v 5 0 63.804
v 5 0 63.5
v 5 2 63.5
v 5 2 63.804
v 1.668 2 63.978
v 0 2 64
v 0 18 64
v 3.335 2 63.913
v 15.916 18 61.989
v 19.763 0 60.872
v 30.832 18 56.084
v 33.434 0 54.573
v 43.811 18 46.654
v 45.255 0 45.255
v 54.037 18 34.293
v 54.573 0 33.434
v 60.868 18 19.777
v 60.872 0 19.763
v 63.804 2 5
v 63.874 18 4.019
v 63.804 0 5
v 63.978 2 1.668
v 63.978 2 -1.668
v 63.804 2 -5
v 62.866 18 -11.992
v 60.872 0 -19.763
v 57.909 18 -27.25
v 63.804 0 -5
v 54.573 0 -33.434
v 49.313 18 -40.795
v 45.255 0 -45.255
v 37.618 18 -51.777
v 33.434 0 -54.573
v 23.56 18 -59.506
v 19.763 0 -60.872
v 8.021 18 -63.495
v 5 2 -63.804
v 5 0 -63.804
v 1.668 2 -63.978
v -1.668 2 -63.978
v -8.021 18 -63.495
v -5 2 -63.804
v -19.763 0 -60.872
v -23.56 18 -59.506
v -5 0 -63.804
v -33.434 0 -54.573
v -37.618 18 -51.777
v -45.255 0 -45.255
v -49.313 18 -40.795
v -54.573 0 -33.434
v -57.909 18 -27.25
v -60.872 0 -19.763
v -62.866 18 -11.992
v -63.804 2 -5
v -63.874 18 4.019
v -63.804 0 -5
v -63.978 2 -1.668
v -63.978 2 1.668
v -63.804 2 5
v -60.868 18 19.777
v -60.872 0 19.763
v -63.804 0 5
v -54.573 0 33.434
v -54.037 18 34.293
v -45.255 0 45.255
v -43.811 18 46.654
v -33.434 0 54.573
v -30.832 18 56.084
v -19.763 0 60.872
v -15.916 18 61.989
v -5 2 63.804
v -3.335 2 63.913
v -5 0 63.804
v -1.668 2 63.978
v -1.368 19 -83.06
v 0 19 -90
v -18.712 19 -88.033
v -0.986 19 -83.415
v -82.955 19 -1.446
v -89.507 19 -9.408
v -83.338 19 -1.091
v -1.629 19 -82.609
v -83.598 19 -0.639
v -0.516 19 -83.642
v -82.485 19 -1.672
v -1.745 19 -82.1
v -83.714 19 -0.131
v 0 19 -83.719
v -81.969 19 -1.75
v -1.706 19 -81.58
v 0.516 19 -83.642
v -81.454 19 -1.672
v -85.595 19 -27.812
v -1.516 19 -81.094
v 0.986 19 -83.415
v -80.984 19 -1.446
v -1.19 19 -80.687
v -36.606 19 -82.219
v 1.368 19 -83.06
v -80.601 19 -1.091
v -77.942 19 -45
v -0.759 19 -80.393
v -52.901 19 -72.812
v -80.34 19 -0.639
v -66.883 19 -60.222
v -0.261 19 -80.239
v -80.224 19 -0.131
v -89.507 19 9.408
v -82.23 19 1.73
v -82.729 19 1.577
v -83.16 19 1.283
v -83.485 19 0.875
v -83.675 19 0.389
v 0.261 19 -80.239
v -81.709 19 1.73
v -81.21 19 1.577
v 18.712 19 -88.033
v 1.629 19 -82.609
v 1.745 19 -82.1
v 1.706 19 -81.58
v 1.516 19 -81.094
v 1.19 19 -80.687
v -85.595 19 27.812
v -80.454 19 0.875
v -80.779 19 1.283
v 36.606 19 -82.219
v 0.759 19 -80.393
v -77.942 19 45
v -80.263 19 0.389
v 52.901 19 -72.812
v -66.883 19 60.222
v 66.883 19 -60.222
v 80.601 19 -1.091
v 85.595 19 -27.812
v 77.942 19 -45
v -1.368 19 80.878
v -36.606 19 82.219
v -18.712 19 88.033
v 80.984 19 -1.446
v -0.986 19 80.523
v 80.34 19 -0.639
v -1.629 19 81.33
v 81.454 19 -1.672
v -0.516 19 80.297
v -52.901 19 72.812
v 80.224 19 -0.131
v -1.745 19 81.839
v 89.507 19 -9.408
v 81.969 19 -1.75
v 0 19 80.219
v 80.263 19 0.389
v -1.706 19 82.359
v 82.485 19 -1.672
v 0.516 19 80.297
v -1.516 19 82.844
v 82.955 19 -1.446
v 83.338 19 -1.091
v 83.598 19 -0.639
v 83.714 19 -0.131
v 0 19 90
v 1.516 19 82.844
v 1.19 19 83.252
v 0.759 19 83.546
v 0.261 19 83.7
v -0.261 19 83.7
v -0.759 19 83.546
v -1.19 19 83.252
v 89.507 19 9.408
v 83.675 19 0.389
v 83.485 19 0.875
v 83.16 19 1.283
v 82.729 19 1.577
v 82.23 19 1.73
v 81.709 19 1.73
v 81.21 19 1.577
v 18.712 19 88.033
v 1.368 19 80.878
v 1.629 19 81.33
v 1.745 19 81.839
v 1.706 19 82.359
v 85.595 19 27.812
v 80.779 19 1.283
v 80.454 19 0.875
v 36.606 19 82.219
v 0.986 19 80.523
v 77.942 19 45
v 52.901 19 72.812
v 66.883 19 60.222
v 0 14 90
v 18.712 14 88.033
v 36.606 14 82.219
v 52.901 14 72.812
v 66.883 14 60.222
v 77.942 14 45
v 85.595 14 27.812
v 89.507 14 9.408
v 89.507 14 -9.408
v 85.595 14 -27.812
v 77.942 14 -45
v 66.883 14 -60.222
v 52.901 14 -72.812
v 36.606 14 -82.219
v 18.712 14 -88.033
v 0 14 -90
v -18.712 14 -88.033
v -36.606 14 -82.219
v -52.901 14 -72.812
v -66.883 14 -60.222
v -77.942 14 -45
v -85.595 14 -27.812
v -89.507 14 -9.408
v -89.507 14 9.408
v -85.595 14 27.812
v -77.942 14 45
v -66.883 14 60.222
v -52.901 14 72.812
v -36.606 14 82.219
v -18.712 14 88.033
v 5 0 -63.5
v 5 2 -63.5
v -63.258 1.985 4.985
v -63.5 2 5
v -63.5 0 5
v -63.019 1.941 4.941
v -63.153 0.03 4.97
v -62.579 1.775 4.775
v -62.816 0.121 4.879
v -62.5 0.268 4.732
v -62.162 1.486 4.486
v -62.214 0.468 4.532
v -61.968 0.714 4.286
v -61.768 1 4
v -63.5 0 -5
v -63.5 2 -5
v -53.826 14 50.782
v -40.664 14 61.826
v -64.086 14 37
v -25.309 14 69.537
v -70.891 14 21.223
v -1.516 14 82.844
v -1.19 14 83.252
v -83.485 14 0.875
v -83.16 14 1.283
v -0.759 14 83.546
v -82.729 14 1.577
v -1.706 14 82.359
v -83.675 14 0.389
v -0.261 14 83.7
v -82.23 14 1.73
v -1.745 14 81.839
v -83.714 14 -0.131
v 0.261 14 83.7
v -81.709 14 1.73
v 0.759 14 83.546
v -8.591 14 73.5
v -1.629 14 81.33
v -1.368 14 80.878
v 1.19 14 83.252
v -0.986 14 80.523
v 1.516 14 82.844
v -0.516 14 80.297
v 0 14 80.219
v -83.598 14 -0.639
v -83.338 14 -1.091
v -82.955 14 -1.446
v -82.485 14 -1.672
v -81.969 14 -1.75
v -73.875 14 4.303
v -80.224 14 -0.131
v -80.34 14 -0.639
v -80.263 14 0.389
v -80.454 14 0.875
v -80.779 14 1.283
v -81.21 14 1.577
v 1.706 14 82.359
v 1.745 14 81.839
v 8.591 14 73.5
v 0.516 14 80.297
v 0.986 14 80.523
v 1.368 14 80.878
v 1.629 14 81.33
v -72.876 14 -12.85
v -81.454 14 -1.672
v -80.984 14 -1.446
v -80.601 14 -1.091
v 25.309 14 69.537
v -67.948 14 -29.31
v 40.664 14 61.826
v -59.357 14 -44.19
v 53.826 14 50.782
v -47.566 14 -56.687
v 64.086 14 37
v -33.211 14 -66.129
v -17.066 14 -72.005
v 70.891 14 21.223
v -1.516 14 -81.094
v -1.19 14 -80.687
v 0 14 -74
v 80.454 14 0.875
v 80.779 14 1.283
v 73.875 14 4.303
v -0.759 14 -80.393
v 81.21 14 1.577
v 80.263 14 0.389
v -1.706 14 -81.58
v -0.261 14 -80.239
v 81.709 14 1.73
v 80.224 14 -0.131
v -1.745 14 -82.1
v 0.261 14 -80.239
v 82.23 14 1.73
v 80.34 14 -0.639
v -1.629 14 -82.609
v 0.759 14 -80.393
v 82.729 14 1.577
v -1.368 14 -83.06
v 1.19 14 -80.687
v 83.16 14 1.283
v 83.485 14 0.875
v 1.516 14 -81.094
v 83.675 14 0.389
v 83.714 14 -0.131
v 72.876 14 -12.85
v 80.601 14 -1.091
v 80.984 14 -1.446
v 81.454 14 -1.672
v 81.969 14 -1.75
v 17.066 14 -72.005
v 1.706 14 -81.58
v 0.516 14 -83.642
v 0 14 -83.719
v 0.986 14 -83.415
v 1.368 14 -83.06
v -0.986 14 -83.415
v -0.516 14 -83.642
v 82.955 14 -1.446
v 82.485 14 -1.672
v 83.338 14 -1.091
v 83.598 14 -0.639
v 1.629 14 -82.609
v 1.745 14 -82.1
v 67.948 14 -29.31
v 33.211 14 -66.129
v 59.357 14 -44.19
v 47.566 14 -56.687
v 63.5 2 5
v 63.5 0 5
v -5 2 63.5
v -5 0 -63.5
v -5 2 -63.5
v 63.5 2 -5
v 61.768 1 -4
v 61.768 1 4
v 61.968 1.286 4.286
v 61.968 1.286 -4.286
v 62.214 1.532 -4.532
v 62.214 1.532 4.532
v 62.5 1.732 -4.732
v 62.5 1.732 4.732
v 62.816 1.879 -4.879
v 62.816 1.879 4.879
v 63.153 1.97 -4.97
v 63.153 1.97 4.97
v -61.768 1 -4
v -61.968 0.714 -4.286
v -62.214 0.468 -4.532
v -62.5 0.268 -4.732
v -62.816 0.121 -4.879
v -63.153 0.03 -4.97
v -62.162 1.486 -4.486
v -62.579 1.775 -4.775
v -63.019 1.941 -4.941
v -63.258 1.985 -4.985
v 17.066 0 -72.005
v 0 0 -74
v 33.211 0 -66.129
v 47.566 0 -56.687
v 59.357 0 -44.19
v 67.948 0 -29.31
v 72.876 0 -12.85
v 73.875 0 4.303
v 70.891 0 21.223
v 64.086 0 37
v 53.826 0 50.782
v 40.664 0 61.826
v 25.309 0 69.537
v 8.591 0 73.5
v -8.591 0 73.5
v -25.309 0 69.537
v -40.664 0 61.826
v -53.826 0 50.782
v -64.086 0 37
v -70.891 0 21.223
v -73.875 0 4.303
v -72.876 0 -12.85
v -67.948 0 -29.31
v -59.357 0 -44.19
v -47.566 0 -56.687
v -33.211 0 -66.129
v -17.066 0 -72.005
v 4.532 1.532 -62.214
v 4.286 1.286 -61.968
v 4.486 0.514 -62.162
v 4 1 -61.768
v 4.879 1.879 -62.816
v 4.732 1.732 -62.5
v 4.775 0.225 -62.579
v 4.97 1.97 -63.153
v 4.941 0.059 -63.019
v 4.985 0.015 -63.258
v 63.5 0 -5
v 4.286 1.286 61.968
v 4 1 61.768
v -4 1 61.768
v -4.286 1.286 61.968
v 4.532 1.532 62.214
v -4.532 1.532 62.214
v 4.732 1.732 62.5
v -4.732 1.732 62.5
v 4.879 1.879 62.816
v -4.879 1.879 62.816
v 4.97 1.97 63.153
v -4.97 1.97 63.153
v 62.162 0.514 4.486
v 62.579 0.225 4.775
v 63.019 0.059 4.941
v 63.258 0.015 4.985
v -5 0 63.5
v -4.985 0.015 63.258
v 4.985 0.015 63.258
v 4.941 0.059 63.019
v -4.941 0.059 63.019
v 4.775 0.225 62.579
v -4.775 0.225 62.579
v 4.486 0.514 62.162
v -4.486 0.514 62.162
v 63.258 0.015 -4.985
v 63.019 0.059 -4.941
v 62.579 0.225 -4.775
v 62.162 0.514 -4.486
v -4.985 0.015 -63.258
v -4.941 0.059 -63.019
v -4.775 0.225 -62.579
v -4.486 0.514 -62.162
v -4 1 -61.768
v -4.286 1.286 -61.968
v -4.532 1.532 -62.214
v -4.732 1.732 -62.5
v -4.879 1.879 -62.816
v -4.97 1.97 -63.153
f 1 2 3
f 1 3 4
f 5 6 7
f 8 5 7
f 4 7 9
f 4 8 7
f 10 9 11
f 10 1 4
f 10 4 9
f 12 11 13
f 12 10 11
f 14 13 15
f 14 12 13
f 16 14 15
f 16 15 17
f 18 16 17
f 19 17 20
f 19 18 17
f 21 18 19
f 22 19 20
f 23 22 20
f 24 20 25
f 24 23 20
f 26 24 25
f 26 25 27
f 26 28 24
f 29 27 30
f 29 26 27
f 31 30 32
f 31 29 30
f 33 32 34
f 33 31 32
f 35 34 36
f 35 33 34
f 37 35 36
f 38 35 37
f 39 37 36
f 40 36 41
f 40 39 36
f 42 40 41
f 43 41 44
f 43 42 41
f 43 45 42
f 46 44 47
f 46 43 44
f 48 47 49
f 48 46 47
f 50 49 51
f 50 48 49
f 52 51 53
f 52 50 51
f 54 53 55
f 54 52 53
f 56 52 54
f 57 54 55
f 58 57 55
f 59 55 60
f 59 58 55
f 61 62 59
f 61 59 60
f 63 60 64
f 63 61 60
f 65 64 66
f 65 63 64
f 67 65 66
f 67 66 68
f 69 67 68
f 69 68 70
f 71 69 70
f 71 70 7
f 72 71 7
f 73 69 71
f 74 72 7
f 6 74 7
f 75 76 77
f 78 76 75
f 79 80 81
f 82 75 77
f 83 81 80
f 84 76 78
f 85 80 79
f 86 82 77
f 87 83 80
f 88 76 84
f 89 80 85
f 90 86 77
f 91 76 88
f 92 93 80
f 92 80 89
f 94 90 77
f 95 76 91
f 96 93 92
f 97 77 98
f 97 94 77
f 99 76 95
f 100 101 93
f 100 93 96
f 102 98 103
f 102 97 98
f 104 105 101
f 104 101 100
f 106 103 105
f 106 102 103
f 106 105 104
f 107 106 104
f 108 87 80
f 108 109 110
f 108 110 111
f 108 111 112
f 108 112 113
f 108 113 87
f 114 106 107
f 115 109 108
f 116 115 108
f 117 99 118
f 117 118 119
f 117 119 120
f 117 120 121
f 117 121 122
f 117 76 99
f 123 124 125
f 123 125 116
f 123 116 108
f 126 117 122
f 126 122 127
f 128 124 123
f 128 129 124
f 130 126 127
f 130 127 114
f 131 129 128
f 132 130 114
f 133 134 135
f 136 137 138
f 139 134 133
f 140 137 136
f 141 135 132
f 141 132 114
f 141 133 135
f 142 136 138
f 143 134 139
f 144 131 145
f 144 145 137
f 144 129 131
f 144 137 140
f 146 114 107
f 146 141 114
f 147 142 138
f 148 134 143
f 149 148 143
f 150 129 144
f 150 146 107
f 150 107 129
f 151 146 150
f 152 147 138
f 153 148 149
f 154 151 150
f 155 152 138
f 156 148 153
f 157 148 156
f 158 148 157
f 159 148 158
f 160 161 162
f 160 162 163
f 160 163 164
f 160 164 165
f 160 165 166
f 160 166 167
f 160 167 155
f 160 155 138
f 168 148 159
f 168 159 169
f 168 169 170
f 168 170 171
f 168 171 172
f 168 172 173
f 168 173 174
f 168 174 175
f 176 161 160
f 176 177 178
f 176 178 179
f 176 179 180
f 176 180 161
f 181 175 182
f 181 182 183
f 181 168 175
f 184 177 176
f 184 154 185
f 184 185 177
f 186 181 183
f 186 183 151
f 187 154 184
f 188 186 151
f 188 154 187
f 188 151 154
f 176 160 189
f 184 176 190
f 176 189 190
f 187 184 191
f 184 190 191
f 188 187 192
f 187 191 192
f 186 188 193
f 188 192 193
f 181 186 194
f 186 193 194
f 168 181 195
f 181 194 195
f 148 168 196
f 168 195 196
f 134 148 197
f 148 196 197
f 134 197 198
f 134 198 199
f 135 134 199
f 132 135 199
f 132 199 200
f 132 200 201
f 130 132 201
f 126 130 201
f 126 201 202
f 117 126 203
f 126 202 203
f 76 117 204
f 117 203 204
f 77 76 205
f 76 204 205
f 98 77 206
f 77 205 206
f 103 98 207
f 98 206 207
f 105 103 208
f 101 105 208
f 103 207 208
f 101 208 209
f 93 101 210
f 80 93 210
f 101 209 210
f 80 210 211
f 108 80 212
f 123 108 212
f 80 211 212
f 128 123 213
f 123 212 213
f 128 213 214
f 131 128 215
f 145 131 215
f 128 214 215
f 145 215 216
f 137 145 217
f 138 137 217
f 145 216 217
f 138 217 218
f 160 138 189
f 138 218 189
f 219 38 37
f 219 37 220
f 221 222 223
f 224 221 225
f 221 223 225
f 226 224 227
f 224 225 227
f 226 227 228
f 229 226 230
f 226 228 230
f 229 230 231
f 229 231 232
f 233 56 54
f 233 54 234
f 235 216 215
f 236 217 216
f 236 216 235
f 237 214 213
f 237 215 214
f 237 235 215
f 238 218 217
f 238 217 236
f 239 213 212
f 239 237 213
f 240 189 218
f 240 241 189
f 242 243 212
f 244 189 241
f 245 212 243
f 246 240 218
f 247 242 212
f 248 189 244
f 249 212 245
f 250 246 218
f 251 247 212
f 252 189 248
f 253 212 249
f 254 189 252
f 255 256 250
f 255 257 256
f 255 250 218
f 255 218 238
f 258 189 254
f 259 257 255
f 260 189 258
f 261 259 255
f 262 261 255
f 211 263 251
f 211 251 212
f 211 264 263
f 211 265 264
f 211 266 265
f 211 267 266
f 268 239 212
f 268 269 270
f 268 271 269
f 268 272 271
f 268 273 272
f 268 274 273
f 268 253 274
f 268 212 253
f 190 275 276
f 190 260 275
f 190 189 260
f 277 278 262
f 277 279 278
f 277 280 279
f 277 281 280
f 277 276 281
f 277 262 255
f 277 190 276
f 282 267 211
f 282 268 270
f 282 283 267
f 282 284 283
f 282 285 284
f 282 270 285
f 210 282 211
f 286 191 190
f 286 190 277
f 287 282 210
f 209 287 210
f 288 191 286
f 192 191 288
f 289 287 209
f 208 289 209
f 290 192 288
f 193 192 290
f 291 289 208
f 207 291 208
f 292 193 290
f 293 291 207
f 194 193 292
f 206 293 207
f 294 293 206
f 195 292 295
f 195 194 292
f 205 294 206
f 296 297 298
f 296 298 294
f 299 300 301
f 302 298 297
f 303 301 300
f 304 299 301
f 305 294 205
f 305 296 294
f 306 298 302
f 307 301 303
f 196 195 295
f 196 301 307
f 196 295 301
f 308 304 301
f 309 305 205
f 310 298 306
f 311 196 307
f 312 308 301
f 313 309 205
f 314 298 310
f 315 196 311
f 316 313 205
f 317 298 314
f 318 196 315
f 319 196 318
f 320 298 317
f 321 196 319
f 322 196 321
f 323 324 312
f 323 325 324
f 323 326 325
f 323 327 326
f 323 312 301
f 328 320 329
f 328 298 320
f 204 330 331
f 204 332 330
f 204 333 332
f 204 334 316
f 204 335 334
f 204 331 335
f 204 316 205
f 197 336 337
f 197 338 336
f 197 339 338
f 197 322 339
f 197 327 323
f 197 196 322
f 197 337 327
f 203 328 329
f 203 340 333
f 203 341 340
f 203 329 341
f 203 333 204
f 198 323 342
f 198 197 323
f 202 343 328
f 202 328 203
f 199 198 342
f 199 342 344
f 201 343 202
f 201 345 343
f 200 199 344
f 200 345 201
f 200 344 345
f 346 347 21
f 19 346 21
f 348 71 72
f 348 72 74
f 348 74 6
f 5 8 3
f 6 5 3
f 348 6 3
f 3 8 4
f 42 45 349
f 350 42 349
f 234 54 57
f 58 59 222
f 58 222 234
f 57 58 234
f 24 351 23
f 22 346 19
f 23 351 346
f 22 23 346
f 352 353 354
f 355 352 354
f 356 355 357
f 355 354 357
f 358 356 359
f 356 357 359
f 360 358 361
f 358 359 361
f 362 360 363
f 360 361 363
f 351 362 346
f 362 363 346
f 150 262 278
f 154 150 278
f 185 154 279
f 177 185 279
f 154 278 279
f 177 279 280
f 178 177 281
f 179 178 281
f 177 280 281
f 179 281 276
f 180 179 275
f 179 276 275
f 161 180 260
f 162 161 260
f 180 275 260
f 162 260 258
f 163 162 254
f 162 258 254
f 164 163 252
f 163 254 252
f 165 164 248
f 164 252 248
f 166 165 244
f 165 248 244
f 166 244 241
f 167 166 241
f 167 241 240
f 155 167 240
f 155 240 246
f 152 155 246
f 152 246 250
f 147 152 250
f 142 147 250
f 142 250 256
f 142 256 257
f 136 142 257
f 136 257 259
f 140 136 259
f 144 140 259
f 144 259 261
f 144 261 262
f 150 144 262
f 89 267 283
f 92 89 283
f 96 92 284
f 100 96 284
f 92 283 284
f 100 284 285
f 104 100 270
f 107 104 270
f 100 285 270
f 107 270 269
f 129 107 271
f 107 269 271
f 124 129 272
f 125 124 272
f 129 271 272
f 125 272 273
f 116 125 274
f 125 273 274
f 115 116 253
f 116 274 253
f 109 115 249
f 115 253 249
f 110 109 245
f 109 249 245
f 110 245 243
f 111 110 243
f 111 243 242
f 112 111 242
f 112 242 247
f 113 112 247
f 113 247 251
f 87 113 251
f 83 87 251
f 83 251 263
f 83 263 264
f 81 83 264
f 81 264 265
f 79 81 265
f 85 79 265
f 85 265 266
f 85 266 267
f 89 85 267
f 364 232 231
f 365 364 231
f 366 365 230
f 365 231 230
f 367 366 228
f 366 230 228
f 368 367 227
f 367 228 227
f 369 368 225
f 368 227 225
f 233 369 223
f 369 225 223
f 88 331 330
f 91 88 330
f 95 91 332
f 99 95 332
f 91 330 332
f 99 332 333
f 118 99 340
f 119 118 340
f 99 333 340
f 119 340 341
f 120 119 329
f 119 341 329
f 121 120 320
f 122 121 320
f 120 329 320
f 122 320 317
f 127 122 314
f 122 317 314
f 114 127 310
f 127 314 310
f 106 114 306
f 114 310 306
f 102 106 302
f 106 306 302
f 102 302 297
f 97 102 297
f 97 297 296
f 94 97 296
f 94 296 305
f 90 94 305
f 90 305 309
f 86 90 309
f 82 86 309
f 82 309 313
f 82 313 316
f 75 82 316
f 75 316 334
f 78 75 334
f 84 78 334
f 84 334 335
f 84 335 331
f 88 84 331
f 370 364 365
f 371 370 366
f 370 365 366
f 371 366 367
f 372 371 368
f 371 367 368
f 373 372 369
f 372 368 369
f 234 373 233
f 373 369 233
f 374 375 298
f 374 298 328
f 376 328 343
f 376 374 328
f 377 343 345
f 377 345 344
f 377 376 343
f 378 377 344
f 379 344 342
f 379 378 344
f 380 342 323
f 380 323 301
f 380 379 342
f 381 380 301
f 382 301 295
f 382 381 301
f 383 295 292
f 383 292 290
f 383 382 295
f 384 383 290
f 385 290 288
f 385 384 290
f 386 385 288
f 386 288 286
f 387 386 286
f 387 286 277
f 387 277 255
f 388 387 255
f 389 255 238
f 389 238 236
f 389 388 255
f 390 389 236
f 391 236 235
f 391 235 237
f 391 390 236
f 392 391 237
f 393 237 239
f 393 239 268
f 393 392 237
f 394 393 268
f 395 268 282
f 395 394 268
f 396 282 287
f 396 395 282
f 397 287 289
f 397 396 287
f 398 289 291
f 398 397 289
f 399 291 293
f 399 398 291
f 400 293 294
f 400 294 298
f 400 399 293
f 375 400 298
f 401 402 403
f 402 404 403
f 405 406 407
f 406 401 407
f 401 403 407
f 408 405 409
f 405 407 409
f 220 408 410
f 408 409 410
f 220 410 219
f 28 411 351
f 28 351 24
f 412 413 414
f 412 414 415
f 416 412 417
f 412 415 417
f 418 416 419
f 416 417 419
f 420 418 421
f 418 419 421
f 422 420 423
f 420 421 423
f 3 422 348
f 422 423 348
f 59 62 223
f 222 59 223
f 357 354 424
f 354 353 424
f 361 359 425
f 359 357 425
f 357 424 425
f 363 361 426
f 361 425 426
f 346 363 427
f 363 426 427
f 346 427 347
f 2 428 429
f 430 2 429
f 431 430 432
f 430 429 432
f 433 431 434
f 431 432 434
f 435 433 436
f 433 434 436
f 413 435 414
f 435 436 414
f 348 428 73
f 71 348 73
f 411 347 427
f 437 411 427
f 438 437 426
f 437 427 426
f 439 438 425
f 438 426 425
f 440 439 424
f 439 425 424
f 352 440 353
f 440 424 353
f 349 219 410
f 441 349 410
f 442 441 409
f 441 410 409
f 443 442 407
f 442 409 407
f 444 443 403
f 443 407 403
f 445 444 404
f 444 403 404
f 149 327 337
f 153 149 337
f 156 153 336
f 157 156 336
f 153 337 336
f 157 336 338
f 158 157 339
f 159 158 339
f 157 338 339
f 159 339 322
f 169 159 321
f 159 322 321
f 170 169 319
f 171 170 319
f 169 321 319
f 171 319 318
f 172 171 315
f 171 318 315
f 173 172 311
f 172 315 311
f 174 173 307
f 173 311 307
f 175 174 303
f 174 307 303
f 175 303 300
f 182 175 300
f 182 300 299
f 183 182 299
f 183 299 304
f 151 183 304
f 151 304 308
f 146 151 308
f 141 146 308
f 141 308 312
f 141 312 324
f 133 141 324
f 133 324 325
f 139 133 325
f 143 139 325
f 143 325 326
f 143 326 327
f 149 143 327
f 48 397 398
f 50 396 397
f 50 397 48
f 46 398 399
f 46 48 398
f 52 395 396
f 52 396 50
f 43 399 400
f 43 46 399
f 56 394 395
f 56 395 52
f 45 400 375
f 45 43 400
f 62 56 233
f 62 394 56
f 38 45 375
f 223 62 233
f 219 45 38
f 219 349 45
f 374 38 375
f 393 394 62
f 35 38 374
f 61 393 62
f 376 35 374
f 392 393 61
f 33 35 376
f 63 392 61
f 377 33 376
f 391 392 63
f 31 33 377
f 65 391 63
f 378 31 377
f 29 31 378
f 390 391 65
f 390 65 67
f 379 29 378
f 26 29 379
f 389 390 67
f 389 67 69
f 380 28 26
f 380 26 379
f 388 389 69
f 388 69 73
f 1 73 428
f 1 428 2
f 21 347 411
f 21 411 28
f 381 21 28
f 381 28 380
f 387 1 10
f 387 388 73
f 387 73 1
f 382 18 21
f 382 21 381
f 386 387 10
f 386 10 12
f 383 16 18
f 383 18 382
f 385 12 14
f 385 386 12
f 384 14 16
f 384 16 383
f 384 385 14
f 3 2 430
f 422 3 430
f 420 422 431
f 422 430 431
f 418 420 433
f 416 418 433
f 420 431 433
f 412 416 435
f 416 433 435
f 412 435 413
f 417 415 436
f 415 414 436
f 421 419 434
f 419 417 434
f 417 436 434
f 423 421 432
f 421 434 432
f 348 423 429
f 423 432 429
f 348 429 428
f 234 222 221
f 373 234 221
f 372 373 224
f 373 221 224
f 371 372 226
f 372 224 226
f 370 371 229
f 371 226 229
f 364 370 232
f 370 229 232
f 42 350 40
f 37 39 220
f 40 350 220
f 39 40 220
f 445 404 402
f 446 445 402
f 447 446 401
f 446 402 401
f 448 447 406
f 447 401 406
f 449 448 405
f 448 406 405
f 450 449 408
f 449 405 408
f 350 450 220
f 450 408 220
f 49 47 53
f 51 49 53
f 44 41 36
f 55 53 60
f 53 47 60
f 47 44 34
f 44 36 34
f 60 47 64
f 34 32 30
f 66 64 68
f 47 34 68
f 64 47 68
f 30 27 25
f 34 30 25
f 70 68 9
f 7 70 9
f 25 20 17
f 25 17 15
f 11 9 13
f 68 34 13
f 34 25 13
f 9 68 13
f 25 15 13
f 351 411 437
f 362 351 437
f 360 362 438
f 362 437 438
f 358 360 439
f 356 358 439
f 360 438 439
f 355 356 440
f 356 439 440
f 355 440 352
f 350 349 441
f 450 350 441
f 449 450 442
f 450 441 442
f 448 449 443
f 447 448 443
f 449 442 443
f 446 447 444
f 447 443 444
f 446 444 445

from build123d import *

# Parameters (mm, degrees)
SKETCH1_R           = 90
SKETCH1_R_2         = 64
BOSS_EXTRUDE1_DEPTH = 18
SKETCH2_R           = 90
BOSS_EXTRUDE2_DEPTH = 1
SKETCH3_R           = 90
SKETCH3_R_2         = 74
CUT_EXTRUDE1_DEPTH  = 14
SKETCH4_W           = 10
SKETCH4_H           = 5
SKETCH4_W_2         = 5
SKETCH4_H_2         = 10
BOSS_EXTRUDE3_DEPTH = 2
FILLET1_R           = 2
SKETCH5_R           = 1.75
CUT_EXTRUDE2_DEPTH  = 75


with BuildPart() as part:
    # Sketch1 → Boss-Extrude1 (new body)
    with BuildSketch(Plane(origin=(0, 0, 0), x_dir=(1, 0, 0), z_dir=(0, 1, 0))):
        with Locations(Location((0, 0, 0), (0, 0, 270))):
            Circle(SKETCH1_R)
        with Locations(Location((0, 0, 0), (0, 0, 270))):
            Circle(SKETCH1_R_2, mode=Mode.SUBTRACT)
    extrude(amount=BOSS_EXTRUDE1_DEPTH)

    # Sketch2 → Boss-Extrude2 (add)
    with BuildSketch(Plane(origin=(0, 18, 0), x_dir=(1, 0, 0), z_dir=(0, 1, 0))):
        with Locations(Location((0, 0, 0), (0, 0, 270))):
            Circle(SKETCH2_R)
    extrude(amount=BOSS_EXTRUDE2_DEPTH)

    # Sketch3 → Cut-Extrude1 (cut)
    with BuildSketch(Plane.XZ):
        with Locations(Location((0, 0, 0), (0, 0, 270))):
            Circle(SKETCH3_R)
        with Locations(Location((0, 0, 0), (0, 0, 270))):
            Circle(SKETCH3_R_2, mode=Mode.SUBTRACT)
    extrude(amount=-CUT_EXTRUDE1_DEPTH, mode=Mode.SUBTRACT)

    # Sketch4 → Boss-Extrude3 (add)
    with BuildSketch(Plane.XZ):
        with Locations((0, 64)):
            Rectangle(SKETCH4_W, SKETCH4_H)
        with Locations((-64, 0)):
            Rectangle(SKETCH4_W_2, SKETCH4_H_2)
        with Locations((64, 0)):
            Rectangle(SKETCH4_W_2, SKETCH4_H_2)
        with Locations((0, -64)):
            Rectangle(SKETCH4_W, SKETCH4_H)
    extrude(amount=-BOSS_EXTRUDE3_DEPTH)

    # Fillet1
    # the kernel refuses this fillet: 2 mm, written as the material it takes off along each edge
    with BuildSketch(Plane(origin=(-61.5, 0, 5), x_dir=(-1, 0, 0), z_dir=(0, 0, -1)), Plane(origin=(-5, 2, 61.5), x_dir=(0, 0, 1), z_dir=(1, 0, 0)), Plane(origin=(61.5, 2, 5), x_dir=(1, 0, 0), z_dir=(0, 0, -1)), Plane(origin=(5, 2, -61.5), x_dir=(0, 0, -1), z_dir=(-1, 0, 0))) as fillet1_piece_1:
        with BuildLine():
            CenterArc((FILLET1_R, FILLET1_R), FILLET1_R, 180, 90)
            Line((0, FILLET1_R), (0, 0))
            Line((0, 0), (FILLET1_R, 0))
        make_face()
    extrude(amount=10, mode=Mode.SUBTRACT)
    with BuildSketch(Plane(origin=(-61.5, 2, 5), x_dir=(-1, 0, 0), z_dir=(0, 0, -1)), Plane(origin=(-5, 0, 61.5), x_dir=(0, 0, 1), z_dir=(1, 0, 0)), Plane(origin=(61.5, 0, 5), x_dir=(1, 0, 0), z_dir=(0, 0, -1)), Plane(origin=(5, 0, -61.5), x_dir=(0, 0, -1), z_dir=(-1, 0, 0))) as fillet1_piece_2:
        with BuildLine():
            CenterArc((FILLET1_R, -FILLET1_R), FILLET1_R, 90, 90)
            Line((0, -FILLET1_R), (0, 0))
            Line((0, 0), (FILLET1_R, 0))
        make_face()
    extrude(amount=10, mode=Mode.SUBTRACT)
    with BuildSketch(Plane(origin=(-61.5, -5, 5), x_dir=(-1, 0, 0), z_dir=(0, 1, 0)), Plane(origin=(5, -5, 61.5), x_dir=(0, 0, 1), z_dir=(0, 1, 0)), Plane(origin=(61.5, -5, -5), x_dir=(1, 0, 0), z_dir=(0, 1, 0)), Plane(origin=(-5, -5, -61.5), x_dir=(0, 0, -1), z_dir=(0, 1, 0))) as fillet1_piece_3:
        with BuildLine():
            CenterArc((FILLET1_R, -FILLET1_R), FILLET1_R, 90, 90)
            Line((0, -FILLET1_R), (0, 0))
            Line((0, 0), (FILLET1_R, 0))
        make_face()
    extrude(amount=12, mode=Mode.SUBTRACT)
    with BuildSketch(Plane(origin=(-61.5, -5, -5), x_dir=(-1, 0, 0), z_dir=(0, 1, 0)), Plane(origin=(-5, -5, 61.5), x_dir=(0, 0, 1), z_dir=(0, 1, 0)), Plane(origin=(61.5, -5, 5), x_dir=(1, 0, 0), z_dir=(0, 1, 0)), Plane(origin=(5, -5, -61.5), x_dir=(0, 0, -1), z_dir=(0, 1, 0))) as fillet1_piece_4:
        with BuildLine():
            CenterArc((FILLET1_R, FILLET1_R), FILLET1_R, 180, 90)
            Line((0, FILLET1_R), (0, 0))
            Line((0, 0), (FILLET1_R, 0))
        make_face()
    extrude(amount=12, mode=Mode.SUBTRACT)

    # Sketch5 → Cut-Extrude2 (cut)
    with BuildSketch(Plane.XZ.offset(-14)):
        with Locations(Location((0, 81.969345849, 0), (0, 0, 270))):
            Circle(SKETCH5_R)
        with Locations(Location((81.969345849, 0, 0), (0, 0, 270))):
            Circle(SKETCH5_R)
        with Locations(Location((0, -81.969345849, 0), (0, 0, 270))):
            Circle(SKETCH5_R)
        with Locations(Location((-81.969345849, 0, 0), (0, 0, 270))):
            Circle(SKETCH5_R)
    extrude(amount=-CUT_EXTRUDE2_DEPTH, mode=Mode.SUBTRACT)


solid = part.part
